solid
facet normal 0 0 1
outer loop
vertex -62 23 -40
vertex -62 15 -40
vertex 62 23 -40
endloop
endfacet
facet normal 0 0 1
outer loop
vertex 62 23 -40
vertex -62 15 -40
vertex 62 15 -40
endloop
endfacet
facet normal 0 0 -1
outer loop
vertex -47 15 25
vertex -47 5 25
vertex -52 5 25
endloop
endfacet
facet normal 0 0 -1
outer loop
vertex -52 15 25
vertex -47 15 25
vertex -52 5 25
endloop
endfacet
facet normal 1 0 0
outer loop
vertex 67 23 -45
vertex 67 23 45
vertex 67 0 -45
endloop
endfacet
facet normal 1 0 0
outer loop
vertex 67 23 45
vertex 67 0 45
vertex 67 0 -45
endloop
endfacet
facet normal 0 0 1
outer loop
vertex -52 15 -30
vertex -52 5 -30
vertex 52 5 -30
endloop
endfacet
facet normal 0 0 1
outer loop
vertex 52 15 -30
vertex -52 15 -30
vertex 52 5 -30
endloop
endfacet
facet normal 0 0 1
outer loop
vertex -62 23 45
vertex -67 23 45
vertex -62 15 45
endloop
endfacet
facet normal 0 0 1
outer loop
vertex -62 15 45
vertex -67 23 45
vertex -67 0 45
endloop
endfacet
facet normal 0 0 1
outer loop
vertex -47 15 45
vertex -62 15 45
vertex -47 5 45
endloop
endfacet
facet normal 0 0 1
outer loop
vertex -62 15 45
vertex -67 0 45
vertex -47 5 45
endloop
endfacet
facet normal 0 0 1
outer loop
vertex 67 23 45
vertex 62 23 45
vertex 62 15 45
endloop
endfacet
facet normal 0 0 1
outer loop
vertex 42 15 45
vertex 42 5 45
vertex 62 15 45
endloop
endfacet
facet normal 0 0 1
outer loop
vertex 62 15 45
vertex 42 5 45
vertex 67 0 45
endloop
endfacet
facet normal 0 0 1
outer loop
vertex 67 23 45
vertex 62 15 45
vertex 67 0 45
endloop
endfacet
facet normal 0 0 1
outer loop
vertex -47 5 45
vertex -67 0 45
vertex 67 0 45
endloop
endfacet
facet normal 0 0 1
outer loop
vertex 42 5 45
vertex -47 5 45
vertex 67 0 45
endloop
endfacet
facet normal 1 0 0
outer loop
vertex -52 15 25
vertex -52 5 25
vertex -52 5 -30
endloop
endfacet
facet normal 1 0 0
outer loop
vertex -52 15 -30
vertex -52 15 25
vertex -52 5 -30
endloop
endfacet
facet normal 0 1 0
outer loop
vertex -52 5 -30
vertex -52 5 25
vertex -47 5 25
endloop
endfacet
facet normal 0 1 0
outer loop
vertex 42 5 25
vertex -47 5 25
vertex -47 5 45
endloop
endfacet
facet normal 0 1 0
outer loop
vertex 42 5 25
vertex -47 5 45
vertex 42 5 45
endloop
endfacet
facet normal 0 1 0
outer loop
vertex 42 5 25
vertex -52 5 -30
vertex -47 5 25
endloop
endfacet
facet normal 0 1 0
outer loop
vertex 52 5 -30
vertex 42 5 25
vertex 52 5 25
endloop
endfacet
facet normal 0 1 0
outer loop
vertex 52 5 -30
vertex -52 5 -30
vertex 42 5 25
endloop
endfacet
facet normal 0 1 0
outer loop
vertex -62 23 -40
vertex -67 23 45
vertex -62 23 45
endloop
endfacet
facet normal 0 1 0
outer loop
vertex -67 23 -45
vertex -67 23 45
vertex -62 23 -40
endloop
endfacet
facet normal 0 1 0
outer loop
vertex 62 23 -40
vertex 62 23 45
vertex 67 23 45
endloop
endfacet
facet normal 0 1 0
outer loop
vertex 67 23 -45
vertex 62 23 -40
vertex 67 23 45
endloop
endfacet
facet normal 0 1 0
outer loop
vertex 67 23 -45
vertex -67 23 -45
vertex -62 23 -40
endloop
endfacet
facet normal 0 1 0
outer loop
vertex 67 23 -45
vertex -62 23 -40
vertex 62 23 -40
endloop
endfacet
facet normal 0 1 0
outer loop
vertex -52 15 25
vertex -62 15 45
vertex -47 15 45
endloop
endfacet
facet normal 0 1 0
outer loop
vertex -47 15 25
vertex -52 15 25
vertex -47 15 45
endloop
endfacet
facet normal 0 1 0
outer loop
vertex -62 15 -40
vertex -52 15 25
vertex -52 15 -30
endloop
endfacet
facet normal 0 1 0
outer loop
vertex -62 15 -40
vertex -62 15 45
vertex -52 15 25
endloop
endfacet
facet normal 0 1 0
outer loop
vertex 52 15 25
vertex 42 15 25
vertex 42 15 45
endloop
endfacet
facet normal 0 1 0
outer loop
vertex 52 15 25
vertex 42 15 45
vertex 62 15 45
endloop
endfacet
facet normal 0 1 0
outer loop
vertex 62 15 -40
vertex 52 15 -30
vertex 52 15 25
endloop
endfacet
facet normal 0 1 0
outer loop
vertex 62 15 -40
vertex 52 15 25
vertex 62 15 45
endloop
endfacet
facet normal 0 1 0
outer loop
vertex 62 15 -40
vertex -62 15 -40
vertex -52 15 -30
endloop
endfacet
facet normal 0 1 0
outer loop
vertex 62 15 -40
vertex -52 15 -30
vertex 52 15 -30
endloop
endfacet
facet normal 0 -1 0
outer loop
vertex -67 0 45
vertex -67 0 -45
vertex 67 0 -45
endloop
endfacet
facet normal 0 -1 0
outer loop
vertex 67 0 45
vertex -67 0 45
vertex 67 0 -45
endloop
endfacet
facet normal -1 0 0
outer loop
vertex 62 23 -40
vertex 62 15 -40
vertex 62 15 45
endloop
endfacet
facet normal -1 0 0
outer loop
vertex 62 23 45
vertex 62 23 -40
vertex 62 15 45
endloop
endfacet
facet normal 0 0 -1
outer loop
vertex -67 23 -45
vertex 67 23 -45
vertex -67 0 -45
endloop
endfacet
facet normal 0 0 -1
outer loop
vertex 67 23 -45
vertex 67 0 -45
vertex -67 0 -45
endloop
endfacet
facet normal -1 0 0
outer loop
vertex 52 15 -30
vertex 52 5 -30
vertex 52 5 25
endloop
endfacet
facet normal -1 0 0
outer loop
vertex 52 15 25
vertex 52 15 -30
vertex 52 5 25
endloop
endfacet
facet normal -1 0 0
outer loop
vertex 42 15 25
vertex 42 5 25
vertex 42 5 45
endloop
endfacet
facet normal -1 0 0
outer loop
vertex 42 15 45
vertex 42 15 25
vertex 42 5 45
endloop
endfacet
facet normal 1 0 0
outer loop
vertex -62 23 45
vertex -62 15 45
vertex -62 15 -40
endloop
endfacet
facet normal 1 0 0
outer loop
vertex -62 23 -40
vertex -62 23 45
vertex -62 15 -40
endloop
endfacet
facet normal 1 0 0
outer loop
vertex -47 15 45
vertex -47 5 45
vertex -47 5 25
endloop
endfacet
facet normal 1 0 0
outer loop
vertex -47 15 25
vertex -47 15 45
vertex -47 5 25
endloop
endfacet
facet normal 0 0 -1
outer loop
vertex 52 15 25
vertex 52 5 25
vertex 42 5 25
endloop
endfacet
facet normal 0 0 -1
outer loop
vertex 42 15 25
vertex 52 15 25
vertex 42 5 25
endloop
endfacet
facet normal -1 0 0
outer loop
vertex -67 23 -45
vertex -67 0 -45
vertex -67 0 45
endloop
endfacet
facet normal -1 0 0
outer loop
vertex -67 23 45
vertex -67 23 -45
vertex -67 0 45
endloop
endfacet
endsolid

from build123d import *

# Parameters (mm, degrees)
SKETCH_1_W      = 134
SKETCH_1_H      = 90
EXTRUDE_1_DEPTH = 5
EXTRUDE_2_DEPTH = 10
EXTRUDE_3_DEPTH = 8


with BuildPart() as part:
    # Эскиз1 → Бобышка-Вытянуть1 (new body)
    with BuildSketch(Plane(origin=(0, 0, 0), x_dir=(1, 0, 0), z_dir=(0, 1, 0))):
        Rectangle(SKETCH_1_W, SKETCH_1_H)
    extrude(amount=EXTRUDE_1_DEPTH)

    # Эскиз2 → Бобышка-Вытянуть2 (add)
    with BuildSketch(Plane(origin=(0, 5, 0), x_dir=(1, 0, 0), z_dir=(0, 1, 0))):
        Polygon((-51.5, -45), (-47, -45), (-47, -25), (-52, -25), (-52, 30), (52, 30), (52, -25), (42, -25), (42, -45), (51.5, -45), (67, -45), (67, -25), (67, 30), (67, 45), (51.5, 45), (-51.5, 45), (-67, 45), (-67, 30), (-67, -25), (-67, -45), align=None)
    extrude(amount=EXTRUDE_2_DEPTH)

    # Эскиз3 → Бобышка-Вытянуть3 (add)
    with BuildSketch(Plane(origin=(0, 15, 0), x_dir=(1, 0, 0), z_dir=(0, 1, 0))):
        Polygon((62, -45), (67, -45), (67, 40), (67, 45), (61.5, 45), (-61.5, 45), (-67, 45), (-67, 40), (-67, -45), (-62, -45), (-62, 40), (62, 40), align=None)
    extrude(amount=EXTRUDE_3_DEPTH)


solid = part.part
